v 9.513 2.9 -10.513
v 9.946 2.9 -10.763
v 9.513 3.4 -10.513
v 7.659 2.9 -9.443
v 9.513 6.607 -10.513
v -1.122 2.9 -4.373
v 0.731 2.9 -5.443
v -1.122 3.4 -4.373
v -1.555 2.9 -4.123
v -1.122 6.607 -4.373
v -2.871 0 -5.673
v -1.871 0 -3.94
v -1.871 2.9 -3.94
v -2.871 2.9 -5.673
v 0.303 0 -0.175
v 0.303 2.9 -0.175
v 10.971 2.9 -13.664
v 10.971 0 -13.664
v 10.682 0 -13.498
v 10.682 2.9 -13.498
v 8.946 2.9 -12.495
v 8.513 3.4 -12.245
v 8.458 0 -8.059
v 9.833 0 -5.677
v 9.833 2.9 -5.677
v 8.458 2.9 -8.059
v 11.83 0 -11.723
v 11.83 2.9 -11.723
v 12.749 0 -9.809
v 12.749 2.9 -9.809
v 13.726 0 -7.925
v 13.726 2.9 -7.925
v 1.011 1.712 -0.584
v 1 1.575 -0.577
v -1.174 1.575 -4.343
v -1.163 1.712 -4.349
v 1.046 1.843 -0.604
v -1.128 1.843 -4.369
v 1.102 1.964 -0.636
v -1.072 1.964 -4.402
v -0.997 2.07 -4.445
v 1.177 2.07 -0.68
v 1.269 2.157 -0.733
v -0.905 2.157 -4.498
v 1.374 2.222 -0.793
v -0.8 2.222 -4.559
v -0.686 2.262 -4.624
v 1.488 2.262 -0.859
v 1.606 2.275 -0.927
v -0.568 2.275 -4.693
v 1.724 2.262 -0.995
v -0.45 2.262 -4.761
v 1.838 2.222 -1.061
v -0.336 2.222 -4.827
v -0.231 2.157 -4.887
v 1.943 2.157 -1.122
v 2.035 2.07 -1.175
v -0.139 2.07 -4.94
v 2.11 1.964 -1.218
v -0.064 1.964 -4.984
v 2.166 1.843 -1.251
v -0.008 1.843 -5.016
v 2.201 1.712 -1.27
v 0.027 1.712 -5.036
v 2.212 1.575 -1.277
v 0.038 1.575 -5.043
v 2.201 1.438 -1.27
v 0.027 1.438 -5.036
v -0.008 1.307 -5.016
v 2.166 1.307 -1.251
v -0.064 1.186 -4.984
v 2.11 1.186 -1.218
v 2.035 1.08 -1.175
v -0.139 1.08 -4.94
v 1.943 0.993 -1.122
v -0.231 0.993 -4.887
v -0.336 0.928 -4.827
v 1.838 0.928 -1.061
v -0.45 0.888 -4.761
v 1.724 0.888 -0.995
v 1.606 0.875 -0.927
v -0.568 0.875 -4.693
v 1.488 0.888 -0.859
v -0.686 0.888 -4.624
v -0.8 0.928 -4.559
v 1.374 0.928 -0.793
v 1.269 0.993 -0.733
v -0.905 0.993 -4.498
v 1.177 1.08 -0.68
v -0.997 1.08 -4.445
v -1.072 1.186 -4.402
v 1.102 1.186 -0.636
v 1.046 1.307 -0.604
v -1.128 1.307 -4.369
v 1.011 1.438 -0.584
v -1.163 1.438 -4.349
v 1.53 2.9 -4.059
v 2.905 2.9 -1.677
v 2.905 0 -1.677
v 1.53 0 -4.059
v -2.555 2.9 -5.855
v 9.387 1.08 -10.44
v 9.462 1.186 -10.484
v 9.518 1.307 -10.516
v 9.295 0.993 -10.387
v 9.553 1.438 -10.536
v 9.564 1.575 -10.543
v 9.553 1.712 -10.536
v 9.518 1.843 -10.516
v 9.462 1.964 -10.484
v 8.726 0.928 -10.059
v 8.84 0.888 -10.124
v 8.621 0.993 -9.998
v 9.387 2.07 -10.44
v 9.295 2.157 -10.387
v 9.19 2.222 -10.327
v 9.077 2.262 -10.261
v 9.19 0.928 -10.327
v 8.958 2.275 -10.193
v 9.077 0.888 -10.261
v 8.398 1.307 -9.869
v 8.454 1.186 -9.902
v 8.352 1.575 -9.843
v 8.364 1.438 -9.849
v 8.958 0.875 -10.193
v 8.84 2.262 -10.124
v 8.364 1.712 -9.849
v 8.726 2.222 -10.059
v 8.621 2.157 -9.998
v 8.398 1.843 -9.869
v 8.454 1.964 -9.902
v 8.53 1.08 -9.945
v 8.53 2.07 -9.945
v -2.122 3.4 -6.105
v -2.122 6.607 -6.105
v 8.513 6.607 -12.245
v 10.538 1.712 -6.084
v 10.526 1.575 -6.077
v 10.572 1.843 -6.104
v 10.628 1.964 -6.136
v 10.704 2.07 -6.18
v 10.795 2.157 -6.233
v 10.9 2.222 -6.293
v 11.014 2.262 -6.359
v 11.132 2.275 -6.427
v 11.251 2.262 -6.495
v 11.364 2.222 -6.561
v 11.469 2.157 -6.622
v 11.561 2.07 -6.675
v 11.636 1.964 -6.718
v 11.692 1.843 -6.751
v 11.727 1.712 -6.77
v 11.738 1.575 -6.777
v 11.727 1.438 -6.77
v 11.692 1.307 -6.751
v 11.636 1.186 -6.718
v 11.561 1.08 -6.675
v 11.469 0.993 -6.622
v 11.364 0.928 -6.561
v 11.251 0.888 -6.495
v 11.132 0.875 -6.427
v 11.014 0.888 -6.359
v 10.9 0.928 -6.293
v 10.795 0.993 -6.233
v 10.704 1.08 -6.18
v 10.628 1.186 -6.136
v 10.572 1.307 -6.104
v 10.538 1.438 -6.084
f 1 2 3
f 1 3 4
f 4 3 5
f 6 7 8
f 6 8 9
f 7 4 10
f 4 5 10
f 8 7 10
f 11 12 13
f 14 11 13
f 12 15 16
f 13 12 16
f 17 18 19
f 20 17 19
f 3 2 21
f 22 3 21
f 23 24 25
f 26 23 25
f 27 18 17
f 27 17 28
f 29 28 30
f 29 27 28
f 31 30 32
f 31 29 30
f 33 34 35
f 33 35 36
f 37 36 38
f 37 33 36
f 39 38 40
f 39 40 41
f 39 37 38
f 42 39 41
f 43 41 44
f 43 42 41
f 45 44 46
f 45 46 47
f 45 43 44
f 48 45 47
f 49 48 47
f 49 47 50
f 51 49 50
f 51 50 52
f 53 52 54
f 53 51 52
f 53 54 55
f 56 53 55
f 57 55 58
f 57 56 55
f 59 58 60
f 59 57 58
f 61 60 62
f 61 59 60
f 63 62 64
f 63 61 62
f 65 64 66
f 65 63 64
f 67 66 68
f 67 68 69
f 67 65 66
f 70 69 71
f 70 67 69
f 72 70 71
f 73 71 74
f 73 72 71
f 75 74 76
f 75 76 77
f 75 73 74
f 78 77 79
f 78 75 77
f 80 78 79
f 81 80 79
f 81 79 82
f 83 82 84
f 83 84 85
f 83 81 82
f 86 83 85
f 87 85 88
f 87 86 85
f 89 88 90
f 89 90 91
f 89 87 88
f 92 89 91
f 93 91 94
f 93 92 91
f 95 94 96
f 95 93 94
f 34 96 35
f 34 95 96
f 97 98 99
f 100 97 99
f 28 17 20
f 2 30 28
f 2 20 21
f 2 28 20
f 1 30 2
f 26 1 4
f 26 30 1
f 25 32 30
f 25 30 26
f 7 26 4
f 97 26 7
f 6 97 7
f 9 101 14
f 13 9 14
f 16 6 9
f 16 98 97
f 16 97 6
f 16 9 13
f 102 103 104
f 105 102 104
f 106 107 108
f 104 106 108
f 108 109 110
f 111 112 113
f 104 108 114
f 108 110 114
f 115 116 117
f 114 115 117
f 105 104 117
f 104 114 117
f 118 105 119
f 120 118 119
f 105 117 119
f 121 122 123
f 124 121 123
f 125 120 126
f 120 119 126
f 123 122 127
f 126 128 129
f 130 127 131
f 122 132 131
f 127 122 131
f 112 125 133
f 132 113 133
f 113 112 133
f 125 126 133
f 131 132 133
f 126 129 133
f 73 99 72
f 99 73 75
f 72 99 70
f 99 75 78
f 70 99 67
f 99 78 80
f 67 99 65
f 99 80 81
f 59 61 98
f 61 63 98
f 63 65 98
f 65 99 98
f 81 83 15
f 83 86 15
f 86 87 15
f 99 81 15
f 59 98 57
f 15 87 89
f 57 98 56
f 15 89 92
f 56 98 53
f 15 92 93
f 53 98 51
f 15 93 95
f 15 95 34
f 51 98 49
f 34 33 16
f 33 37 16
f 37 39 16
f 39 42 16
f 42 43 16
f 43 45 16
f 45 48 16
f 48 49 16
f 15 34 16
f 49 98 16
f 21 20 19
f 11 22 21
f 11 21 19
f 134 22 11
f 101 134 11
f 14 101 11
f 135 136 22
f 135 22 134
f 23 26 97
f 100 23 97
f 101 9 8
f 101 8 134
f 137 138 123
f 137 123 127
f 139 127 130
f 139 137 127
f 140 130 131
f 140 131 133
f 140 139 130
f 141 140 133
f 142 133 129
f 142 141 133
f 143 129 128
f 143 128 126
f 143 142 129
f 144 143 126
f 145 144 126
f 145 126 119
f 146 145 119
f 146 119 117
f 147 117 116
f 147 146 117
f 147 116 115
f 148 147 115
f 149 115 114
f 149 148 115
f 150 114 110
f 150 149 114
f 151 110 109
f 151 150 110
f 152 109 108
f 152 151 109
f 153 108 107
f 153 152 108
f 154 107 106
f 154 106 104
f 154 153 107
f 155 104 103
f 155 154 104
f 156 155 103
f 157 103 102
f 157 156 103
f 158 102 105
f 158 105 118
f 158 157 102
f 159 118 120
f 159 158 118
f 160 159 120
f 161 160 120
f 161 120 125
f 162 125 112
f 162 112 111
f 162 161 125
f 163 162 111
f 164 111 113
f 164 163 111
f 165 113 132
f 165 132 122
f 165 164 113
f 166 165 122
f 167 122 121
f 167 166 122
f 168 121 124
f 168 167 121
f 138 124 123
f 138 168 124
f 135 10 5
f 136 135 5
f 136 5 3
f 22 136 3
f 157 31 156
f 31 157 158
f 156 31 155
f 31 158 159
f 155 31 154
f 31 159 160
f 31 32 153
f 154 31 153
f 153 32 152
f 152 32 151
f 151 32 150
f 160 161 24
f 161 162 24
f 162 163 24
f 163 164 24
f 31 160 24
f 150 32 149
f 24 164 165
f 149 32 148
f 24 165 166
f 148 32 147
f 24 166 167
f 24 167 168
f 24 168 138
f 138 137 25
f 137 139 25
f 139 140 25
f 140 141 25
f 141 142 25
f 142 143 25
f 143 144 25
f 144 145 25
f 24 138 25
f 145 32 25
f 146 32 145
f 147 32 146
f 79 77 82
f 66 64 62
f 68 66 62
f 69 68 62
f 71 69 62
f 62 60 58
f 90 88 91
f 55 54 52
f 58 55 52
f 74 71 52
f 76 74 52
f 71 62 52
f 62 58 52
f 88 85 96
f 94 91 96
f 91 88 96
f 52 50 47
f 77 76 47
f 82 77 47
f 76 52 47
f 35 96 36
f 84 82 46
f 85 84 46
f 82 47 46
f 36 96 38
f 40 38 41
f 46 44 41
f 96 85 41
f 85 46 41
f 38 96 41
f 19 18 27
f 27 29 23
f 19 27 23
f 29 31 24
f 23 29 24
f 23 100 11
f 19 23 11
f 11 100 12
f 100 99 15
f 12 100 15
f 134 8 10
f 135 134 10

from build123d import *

# Parameters (mm, degrees)
SKETCH1_R             = 0.7
BOSS_EXTRUDE1_DEPTH   = 4.348
BOSS_EXTRUDE1_2_DEPTH = 4.348
SKETCH3_W             = 8
SKETCH3_H             = 2.9
BOSS_EXTRUDE2_DEPTH   = 1.598
BOSS_EXTRUDE3_DEPTH   = 2
MOVE_FACE1_BY         = 0.35
CHAMFER1_SIZE         = 0.5
BOSS_EXTRUDE4_DEPTH   = 2.9
MOVE_FACE2_DEPTH      = 2.9


# Read off the part's stored shape, not the designer's step: Move Face2
with BuildPart() as part:
    # Sketch1 → Boss-Extrude1 (new body)
    with BuildSketch(Plane(origin=(0, 0, 0), x_dir=(-0.8660254037844383, 0, 0.5000000000000009), z_dir=(-0.5000000000000008, 0, -0.8660254037844382))):
        Polygon((-11.354412945, 1.65), (-11.354412945, 2.9), (-16, 2.9), (-16, 0), (-11.354412945, 0), align=None)
        with Locations((-12.854412945, 1.575)):
            Circle(SKETCH1_R, mode=Mode.SUBTRACT)
    extrude(amount=BOSS_EXTRUDE1_DEPTH)



with BuildPart() as body_2:
    # Sketch1 → Boss-Extrude1 2 (new body)
    with BuildSketch(Plane(origin=(0, 0, 0), x_dir=(-0.8660254037844383, 0, 0.5000000000000009), z_dir=(-0.5000000000000008, 0, -0.8660254037844382))):
        Polygon((-3.354412945, 2.9), (-3.354412945, 1.65), (-3.354412945, 0), (0, 0), (0, 2.9), align=None)
        with Locations((-1.854412945, 1.575)):
            Circle(SKETCH1_R, mode=Mode.SUBTRACT)
    extrude(amount=BOSS_EXTRUDE1_2_DEPTH)


with BuildPart() as part_1:
    add(part.part)

    add(body_2.part)  # Boss-Extrude2 merges body 2
    # Sketch3 → Boss-Extrude2 (add)
    with BuildSketch(Plane(origin=(-2.174, 0, -3.765478456), x_dir=(-0.8660254037844384, 0, 0.5000000000000007), z_dir=(-0.5000000000000006, 0, -0.8660254037844383))):
        with Locations((-7.354412945, 1.45)):
            Rectangle(SKETCH3_W, SKETCH3_H)
    extrude(amount=-BOSS_EXTRUDE2_DEPTH)

    # Sketch4 → Boss-Extrude3 (add)
    with BuildSketch(Plane(origin=(-2.174, 0, -3.765478456), x_dir=(-0.8660254037844384, 0, 0.5000000000000007), z_dir=(-0.5000000000000006, 0, -0.8660254037844383))):
        Polygon((-1.214412945, 6.607188143), (-13.494412945, 6.607188143), (-13.494412945, 2.9), (-16, 2.9), (-16, 0), (0, 0), (0, 2.9), (-1.214412945, 2.9), align=None)
    extrude(amount=BOSS_EXTRUDE3_DEPTH)

    # Move Face1: a face moved inward by 0.35
    extrude(part_1.faces().sort_by_distance((-1.587, 1.45, -2.748764632))[0], amount=MOVE_FACE1_BY, dir=(0.866025404, 0, -0.5), mode=Mode.SUBTRACT)

    # Chamfer1
    chamfer1_edges = [part_1.edges().sort_by_distance(p)[0] for p in [
        (-1.622287539, 2.9, -5.238710332),
        (9.01250442, 2.9, -11.378710332),
    ]]
    chamfer(chamfer1_edges, length=CHAMFER1_SIZE)

    # Sketch5 → Boss-Extrude4 (add)
    with BuildSketch(Plane.XZ):
        with BuildLine():
            ThreePointArc((13.856406461, -8), (12.412098979, -10.837697405), (11.10213411, -13.739859135))
            Line((11.10213411, -13.739859135), (10.682406461, -13.497529263))
            Line((10.682406461, -13.497529263), (13.856406461, -8))
        make_face()
    extrude(amount=-BOSS_EXTRUDE4_DEPTH)

    # Move Face2 outline → Move Face2 (cut)
    with BuildSketch(Plane(origin=(0, 0, 0), x_dir=(1, 0, 0), z_dir=(0, 1, 0))):
        with BuildLine():
            ThreePointArc((10.97124357, 13.664289446), (12.281828843, 10.762456911), (13.726446616, 7.924967649))
            Line((13.726446616, 7.924967649), (13.856406461, 8))
            ThreePointArc((13.856406461, 8), (12.412098979, 10.837697405), (11.10213411, 13.739859135))
            Line((11.10213411, 13.739859135), (10.97124357, 13.664289446))
        make_face()
    extrude(amount=MOVE_FACE2_DEPTH, mode=Mode.SUBTRACT)


solid = part_1.part
